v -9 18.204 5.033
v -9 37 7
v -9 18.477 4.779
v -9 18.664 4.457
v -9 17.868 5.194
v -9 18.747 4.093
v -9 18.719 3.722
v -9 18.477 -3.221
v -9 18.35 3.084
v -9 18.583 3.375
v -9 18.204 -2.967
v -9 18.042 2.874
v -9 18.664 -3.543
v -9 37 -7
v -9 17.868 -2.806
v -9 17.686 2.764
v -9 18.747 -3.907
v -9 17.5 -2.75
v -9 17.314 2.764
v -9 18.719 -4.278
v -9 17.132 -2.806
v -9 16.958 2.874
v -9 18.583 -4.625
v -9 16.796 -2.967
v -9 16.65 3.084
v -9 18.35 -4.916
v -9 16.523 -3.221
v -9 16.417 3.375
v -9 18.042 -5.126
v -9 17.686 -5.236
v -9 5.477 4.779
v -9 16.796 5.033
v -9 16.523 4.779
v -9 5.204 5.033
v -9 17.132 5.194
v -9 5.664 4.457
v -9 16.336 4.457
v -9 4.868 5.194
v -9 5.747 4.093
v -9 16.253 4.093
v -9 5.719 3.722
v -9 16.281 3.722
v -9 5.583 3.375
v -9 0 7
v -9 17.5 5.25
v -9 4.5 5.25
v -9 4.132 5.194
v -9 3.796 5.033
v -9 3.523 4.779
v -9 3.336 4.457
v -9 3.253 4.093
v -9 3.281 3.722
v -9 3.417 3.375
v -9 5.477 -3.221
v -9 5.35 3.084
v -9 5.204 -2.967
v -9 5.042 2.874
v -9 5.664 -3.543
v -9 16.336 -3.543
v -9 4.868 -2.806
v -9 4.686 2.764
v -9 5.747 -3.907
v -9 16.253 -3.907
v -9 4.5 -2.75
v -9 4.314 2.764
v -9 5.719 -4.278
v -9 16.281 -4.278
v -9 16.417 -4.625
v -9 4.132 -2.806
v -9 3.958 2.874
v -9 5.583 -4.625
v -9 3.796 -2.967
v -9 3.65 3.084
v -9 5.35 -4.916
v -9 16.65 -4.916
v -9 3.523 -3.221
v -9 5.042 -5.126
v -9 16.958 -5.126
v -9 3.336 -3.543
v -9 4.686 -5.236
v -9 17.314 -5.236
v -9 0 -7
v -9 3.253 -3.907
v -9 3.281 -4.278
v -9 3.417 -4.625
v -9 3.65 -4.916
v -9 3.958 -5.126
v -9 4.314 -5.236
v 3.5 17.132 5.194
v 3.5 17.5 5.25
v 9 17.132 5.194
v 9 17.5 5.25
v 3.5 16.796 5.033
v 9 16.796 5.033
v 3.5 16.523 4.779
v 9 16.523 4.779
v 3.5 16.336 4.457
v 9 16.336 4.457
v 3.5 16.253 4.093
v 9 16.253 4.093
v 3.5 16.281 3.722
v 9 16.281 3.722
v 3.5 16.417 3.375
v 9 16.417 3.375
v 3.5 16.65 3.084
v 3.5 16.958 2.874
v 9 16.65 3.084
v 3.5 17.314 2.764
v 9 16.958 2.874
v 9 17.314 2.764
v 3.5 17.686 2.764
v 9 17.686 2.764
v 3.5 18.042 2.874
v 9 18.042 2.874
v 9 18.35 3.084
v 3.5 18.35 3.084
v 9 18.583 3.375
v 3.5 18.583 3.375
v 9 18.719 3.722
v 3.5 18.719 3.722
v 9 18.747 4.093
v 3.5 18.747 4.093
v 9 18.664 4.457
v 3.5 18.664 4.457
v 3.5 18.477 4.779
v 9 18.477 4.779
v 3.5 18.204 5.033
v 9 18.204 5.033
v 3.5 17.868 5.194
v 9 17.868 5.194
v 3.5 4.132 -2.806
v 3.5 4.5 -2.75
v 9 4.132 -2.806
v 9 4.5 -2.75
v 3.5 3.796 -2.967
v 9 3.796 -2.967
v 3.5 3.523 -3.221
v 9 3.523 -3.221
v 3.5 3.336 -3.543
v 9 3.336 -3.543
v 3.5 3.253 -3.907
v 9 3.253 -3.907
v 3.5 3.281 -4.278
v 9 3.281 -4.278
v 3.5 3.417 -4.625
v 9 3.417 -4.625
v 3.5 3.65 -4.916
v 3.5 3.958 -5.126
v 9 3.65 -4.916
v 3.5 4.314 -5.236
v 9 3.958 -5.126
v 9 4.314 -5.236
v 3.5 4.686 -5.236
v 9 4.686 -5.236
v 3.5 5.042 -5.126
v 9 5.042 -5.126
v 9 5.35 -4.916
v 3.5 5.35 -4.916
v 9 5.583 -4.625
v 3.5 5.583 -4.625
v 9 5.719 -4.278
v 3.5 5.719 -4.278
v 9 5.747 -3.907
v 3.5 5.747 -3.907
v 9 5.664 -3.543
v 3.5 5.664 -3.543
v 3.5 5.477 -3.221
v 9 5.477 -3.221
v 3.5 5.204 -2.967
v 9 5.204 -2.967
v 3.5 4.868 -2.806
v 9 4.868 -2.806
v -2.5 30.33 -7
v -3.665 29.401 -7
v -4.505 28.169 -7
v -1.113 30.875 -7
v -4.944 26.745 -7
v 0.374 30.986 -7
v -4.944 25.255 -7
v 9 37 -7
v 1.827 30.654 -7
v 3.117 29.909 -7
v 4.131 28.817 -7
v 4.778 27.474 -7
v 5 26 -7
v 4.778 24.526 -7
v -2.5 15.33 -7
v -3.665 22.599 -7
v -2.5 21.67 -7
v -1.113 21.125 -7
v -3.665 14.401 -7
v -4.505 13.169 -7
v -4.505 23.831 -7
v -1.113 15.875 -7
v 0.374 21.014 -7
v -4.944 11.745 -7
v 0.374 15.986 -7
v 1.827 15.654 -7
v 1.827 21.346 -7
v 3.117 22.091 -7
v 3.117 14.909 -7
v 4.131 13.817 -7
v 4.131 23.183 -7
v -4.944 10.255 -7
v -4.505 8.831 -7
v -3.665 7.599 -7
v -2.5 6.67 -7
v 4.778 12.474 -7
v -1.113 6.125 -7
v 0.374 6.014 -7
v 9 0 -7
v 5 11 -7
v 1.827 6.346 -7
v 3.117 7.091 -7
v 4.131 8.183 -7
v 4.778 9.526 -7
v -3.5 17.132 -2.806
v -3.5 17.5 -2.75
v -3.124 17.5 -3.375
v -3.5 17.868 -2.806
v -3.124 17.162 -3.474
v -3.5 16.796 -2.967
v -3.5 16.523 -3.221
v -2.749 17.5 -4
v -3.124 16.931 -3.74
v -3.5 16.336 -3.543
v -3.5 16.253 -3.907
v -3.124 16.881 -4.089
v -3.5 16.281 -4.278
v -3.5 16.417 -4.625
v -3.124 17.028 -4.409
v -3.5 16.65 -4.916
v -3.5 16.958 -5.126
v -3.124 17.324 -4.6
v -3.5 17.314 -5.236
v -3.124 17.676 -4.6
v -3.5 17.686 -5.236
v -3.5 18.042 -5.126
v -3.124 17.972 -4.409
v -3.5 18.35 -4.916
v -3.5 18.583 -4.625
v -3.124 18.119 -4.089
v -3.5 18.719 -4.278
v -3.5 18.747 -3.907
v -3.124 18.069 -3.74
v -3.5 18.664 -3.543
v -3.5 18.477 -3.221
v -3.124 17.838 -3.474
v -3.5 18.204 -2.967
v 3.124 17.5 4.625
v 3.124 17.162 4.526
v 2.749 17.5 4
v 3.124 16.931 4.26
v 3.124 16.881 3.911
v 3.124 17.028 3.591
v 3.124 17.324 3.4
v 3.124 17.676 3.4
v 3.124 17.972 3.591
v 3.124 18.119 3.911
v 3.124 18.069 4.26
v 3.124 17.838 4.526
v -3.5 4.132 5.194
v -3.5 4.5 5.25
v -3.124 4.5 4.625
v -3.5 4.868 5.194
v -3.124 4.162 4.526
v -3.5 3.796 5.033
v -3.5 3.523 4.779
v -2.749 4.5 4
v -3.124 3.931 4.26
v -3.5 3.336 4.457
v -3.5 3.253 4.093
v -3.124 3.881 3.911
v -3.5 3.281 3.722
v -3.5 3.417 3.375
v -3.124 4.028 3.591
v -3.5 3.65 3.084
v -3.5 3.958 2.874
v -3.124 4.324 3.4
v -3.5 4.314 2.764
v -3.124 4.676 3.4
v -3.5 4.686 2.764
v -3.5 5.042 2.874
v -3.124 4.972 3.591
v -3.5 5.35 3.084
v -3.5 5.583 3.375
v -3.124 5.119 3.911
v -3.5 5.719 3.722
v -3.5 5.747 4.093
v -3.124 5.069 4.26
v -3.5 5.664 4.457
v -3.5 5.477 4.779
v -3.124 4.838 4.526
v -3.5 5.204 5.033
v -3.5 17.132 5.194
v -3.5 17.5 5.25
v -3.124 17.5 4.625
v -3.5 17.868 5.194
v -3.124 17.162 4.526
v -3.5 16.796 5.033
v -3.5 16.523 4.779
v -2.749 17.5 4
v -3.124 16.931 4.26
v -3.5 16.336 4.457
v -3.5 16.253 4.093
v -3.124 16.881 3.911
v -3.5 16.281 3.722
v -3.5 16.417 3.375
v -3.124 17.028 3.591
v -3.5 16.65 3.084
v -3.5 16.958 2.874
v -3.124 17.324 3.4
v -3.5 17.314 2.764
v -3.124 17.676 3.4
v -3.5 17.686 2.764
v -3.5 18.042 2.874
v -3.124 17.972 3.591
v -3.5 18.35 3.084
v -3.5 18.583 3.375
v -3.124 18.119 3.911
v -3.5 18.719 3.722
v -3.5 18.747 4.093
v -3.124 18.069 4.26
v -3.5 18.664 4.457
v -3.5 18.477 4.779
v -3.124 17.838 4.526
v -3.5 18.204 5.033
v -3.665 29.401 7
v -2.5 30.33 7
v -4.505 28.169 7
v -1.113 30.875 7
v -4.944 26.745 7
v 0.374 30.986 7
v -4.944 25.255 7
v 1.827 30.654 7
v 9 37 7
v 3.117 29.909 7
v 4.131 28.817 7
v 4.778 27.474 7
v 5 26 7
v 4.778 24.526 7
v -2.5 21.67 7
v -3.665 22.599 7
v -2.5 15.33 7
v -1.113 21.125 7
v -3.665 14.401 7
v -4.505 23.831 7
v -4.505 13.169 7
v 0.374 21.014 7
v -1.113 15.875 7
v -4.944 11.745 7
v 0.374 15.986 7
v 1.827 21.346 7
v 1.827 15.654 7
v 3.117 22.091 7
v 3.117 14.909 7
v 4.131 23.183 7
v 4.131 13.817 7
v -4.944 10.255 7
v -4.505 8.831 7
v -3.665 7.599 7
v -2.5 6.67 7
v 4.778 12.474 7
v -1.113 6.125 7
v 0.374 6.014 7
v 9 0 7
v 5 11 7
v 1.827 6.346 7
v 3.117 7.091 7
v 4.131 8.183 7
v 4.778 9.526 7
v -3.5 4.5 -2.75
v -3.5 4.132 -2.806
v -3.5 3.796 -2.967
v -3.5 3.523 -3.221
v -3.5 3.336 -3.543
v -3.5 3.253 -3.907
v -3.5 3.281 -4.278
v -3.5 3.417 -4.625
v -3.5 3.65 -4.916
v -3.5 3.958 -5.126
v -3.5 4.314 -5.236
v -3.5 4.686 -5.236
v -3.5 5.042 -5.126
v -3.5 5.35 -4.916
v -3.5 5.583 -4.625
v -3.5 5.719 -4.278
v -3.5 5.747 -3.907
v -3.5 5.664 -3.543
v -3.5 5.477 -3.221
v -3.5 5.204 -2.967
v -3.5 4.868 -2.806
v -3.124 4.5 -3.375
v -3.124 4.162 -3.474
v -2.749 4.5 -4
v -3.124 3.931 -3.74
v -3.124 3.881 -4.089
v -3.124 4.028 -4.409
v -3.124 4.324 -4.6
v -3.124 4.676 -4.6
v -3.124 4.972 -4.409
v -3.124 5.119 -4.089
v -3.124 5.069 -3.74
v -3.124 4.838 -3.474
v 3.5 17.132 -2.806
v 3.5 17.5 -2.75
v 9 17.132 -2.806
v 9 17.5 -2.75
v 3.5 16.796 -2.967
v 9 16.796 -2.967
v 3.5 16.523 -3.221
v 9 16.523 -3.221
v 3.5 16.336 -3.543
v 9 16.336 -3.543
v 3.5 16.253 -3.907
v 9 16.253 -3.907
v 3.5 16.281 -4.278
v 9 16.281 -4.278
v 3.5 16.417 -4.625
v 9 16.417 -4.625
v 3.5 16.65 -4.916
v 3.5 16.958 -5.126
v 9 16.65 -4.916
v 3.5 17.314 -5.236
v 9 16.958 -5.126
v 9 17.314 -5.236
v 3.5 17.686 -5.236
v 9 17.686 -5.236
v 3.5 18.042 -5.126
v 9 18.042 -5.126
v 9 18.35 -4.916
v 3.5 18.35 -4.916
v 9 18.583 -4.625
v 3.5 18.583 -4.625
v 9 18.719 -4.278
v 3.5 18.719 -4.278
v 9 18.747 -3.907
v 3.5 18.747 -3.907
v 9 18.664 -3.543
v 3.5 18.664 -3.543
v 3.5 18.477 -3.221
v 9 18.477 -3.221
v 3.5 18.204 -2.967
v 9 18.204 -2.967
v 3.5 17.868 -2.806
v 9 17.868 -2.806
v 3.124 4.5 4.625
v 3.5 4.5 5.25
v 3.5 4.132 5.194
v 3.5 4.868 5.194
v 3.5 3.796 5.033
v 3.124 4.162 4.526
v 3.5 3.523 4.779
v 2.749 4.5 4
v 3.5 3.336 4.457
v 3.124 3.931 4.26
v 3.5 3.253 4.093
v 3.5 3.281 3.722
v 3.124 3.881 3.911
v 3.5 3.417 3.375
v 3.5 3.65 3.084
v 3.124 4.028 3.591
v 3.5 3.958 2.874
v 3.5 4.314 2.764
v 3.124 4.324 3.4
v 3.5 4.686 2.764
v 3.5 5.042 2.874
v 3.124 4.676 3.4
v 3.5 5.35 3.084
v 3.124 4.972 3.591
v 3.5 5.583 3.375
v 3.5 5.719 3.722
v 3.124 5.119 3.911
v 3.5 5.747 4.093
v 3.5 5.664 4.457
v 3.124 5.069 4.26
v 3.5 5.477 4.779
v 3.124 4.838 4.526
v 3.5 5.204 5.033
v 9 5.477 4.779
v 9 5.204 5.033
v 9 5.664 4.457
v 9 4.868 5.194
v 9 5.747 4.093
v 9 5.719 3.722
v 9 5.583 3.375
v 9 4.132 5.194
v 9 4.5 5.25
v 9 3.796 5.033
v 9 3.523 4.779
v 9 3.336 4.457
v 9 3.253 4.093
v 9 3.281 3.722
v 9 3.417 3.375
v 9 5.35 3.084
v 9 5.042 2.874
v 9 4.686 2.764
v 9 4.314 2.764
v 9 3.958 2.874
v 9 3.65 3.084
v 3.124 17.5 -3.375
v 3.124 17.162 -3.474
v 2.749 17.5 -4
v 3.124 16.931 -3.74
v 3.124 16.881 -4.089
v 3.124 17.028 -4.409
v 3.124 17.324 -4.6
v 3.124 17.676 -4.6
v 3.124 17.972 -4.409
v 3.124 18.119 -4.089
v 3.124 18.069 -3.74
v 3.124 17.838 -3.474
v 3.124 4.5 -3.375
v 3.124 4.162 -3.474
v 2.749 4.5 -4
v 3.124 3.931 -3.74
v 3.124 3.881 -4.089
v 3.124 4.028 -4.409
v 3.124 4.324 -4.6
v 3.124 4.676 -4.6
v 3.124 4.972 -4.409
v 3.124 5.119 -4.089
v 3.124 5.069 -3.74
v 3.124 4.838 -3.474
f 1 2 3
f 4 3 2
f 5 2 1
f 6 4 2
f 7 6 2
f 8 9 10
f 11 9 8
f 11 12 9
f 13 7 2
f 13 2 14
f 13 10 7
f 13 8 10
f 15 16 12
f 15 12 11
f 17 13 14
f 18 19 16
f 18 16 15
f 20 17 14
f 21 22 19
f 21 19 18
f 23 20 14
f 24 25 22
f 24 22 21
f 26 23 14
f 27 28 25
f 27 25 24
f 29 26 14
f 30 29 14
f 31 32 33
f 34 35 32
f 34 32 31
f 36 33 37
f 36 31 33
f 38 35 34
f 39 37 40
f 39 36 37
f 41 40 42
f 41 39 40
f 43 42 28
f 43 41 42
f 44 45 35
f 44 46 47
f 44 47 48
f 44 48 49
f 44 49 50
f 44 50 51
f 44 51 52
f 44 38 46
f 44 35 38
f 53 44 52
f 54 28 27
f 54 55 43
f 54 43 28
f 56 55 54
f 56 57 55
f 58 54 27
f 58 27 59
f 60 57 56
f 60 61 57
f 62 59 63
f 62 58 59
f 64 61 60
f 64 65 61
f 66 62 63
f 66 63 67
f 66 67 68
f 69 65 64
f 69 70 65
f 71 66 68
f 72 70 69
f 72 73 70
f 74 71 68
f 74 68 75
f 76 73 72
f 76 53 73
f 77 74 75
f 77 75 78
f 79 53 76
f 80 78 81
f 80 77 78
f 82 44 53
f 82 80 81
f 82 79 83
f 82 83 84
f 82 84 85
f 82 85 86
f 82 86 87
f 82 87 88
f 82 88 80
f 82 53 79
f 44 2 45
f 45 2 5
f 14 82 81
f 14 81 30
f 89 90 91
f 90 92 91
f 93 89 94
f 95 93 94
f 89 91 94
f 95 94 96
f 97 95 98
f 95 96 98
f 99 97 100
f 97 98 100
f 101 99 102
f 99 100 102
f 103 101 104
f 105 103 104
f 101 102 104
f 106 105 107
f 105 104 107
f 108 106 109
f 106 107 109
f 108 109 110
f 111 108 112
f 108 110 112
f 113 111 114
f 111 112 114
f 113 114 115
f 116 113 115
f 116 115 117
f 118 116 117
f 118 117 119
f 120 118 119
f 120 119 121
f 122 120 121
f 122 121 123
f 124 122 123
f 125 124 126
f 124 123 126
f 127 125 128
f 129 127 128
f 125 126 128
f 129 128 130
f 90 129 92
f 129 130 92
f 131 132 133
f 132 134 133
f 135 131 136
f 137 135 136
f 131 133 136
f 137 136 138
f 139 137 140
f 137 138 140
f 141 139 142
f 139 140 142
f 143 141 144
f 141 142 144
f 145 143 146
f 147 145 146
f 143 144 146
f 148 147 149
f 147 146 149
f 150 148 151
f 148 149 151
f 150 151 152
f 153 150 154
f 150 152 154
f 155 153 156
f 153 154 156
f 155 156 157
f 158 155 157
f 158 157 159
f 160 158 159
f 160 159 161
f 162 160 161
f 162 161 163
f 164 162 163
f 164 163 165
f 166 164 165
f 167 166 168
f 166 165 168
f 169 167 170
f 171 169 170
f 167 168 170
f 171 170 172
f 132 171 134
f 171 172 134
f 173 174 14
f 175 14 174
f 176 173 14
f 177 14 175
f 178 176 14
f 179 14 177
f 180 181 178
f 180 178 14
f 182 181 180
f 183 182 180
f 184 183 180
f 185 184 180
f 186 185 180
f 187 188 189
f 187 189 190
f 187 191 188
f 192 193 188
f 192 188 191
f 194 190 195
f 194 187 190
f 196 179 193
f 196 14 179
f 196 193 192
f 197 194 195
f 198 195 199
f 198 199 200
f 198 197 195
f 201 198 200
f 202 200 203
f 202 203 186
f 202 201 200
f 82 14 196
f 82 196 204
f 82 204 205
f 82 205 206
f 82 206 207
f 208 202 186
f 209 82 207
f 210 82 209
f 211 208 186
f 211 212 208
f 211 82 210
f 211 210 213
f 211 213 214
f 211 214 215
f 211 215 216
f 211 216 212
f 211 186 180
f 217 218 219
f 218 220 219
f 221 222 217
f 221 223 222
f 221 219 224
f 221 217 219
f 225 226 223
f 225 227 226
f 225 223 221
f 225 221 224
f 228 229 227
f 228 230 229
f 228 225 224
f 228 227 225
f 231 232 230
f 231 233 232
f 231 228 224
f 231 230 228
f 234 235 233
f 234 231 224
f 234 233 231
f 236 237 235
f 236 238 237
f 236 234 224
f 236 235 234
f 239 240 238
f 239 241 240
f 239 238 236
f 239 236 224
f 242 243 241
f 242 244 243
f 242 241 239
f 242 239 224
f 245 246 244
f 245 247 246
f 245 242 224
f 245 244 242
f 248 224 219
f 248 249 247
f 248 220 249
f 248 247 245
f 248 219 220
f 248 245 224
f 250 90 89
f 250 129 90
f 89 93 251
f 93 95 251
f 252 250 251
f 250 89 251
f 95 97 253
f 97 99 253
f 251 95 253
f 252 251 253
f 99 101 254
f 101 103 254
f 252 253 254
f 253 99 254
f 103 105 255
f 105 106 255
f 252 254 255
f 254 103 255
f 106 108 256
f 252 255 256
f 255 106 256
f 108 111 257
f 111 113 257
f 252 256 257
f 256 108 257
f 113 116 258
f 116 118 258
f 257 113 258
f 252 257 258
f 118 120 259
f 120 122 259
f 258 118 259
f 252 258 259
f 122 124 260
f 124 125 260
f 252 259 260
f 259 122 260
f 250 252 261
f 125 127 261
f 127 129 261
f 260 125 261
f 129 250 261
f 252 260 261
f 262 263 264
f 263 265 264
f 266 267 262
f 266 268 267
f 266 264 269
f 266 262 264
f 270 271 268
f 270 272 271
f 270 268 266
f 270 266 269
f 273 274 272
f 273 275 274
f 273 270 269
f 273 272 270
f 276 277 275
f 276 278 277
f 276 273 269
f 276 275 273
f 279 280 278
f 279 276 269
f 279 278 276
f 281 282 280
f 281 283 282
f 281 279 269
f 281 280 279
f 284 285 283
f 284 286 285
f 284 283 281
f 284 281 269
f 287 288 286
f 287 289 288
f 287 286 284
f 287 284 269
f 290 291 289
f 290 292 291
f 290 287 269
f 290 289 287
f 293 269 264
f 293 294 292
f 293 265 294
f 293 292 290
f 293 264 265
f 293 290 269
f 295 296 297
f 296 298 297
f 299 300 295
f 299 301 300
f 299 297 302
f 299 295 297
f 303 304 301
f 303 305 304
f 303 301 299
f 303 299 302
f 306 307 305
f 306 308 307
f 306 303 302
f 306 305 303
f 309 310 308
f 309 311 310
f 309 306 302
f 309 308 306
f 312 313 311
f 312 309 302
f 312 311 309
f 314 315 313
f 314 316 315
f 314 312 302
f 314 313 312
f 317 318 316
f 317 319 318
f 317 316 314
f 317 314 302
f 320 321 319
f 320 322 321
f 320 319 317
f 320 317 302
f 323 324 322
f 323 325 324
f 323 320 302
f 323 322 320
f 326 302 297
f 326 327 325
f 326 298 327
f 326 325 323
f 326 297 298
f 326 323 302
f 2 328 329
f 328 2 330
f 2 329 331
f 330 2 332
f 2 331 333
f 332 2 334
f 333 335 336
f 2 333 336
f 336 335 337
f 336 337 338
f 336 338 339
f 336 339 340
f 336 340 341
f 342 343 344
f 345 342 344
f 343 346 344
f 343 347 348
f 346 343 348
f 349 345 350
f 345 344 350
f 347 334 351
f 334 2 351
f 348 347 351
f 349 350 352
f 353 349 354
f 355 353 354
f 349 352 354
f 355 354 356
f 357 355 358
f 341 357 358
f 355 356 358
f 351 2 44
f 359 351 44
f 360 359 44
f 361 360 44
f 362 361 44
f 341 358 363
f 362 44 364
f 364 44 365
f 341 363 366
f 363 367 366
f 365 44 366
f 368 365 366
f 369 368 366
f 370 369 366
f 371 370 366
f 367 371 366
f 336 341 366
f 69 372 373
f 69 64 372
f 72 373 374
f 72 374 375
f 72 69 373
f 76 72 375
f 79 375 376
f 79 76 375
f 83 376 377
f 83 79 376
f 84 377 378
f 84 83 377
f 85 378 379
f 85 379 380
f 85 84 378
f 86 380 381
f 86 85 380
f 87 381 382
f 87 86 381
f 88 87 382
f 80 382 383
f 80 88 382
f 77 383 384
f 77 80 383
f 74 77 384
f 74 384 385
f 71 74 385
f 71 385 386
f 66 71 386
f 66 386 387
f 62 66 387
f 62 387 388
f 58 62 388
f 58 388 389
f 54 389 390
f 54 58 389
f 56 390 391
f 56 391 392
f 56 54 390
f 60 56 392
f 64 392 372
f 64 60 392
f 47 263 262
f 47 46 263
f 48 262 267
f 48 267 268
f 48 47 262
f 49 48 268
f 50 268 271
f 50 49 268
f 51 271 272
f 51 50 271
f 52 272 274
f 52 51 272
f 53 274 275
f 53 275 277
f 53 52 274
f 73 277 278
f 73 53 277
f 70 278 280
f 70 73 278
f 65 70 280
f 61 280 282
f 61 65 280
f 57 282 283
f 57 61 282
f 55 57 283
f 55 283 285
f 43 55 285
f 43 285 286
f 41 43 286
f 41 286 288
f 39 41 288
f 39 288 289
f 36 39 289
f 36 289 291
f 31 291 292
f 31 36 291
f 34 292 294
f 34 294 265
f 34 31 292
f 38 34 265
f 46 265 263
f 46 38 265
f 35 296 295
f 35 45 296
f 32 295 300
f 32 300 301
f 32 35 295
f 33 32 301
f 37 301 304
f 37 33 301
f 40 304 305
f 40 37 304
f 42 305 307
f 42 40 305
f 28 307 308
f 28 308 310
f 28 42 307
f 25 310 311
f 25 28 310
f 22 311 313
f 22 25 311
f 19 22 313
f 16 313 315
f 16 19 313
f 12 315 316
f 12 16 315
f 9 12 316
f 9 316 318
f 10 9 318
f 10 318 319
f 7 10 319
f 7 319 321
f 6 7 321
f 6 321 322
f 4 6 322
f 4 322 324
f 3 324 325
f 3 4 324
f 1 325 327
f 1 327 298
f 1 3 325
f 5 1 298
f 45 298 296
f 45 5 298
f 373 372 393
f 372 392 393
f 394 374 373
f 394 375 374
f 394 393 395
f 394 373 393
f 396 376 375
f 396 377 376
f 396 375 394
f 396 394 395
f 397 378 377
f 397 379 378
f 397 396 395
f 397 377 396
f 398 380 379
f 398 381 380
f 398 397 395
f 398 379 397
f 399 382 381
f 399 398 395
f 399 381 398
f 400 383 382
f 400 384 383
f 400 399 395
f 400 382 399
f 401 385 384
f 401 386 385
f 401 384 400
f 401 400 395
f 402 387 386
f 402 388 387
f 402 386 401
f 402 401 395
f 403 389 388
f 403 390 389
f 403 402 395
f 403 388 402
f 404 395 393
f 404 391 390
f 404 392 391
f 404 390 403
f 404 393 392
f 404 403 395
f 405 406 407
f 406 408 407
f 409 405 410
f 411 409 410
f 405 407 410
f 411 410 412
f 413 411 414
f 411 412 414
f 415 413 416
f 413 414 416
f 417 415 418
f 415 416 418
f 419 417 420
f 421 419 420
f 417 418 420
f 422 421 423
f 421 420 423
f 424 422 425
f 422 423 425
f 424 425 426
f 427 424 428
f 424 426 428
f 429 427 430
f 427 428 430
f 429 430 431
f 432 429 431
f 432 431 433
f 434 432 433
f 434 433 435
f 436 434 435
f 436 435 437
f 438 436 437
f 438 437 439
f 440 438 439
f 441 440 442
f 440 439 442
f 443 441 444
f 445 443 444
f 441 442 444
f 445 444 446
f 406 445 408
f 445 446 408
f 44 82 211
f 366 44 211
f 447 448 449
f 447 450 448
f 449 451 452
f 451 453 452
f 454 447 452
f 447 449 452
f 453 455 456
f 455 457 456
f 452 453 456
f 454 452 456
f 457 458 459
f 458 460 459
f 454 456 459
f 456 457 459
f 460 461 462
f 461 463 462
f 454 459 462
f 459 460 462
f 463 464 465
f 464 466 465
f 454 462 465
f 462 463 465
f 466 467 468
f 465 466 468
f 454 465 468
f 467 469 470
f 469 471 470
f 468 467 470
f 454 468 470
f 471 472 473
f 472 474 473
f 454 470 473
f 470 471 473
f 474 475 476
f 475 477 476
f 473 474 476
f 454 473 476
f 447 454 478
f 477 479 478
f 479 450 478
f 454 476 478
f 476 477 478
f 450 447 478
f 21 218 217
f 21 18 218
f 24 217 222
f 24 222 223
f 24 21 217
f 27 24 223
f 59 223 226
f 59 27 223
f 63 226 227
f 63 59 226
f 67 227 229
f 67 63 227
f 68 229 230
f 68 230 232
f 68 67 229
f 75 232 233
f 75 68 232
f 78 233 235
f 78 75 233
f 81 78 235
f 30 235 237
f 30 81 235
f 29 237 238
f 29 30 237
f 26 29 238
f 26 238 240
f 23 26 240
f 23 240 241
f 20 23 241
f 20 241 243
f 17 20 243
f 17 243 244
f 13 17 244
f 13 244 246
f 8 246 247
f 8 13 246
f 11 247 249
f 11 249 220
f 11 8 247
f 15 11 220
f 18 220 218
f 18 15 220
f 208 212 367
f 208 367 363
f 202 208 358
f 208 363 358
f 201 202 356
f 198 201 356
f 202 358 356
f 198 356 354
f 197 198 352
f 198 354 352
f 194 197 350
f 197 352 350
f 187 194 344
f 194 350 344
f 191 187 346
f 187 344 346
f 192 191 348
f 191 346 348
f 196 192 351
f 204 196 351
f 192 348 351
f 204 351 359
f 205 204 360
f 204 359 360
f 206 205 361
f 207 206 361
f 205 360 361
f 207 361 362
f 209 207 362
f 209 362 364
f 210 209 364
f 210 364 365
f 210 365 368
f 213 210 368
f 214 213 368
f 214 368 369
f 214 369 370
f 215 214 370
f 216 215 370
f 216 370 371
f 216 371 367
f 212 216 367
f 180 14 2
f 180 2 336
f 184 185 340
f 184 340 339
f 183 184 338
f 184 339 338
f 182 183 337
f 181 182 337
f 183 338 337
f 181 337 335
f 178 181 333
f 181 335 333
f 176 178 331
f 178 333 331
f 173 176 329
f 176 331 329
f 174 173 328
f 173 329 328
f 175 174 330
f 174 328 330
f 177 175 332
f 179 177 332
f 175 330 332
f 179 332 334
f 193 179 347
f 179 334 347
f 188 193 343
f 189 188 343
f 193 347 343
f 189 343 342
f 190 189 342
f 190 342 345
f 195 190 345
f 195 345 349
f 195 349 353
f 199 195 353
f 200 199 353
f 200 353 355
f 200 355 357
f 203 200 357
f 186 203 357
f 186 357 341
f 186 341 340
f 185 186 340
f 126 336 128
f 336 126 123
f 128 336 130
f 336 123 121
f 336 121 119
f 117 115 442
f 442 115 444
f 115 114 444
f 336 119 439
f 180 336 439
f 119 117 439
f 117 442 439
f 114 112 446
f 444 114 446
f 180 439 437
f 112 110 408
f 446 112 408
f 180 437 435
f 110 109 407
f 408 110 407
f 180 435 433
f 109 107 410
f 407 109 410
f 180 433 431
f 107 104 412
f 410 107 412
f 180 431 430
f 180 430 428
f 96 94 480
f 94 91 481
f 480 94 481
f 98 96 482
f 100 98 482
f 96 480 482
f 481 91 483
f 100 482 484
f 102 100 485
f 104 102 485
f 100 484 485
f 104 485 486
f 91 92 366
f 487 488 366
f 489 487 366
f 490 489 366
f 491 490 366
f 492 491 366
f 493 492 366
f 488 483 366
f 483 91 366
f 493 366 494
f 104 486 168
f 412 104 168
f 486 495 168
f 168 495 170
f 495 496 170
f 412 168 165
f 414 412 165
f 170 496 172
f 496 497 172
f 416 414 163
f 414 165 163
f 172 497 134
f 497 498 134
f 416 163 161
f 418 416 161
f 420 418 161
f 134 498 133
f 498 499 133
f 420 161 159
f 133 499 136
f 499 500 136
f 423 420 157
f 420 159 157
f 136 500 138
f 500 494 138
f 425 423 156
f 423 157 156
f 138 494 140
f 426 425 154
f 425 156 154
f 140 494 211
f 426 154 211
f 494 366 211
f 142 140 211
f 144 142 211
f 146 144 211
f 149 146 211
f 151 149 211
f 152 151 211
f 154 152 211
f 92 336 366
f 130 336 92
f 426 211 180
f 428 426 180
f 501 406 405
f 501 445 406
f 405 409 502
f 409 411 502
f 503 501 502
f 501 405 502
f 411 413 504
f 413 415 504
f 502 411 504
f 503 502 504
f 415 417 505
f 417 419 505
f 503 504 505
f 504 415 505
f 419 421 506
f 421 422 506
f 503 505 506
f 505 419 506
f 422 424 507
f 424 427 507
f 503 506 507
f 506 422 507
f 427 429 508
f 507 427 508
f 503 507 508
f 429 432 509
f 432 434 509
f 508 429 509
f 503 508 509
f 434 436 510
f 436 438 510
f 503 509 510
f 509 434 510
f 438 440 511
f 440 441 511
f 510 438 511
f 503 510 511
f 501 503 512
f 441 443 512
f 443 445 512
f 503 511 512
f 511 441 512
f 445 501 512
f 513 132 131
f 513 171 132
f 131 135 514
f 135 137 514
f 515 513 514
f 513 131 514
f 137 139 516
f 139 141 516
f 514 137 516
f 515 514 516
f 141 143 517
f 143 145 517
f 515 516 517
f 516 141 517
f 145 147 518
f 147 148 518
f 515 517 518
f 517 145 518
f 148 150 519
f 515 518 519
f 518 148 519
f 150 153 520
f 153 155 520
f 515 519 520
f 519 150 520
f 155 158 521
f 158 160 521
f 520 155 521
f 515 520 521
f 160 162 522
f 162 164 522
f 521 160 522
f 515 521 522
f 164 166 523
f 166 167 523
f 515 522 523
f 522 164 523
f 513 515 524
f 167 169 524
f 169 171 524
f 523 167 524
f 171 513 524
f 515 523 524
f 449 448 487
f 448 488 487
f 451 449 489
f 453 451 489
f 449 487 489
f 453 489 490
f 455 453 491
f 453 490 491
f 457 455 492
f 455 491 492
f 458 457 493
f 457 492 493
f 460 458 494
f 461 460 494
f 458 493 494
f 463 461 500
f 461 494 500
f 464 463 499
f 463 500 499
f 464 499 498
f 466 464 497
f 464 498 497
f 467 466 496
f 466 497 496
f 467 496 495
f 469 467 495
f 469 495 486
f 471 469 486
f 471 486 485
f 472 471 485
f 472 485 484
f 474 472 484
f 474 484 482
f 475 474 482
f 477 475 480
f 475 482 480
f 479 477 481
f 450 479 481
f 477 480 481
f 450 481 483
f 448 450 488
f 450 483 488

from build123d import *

# Parameters (mm, degrees)
SKETCH2_W                      = 18
SKETCH2_H                      = 14
BOSS_EXTRUDE1_DEPTH            = 37
SKETCH3_R                      = 5
CUT_EXTRUDE1_DEPTH             = 15
M3X0_5_TAPPED_HOLE1_AT_2_COUNT = 2
M3X0_5_TAPPED_HOLE1_AT_2_PITCH = 8
M3X0_5_TAPPED_HOLE1_AT_3_COUNT = 2
M3X0_5_TAPPED_HOLE1_AT_3_PITCH = 15.264337522
M3X0_5_TAPPED_HOLE1_AT_4_COUNT = 2
M3X0_5_TAPPED_HOLE1_AT_4_PITCH = 13


with BuildPart() as part:
    # Sketch2 → Boss-Extrude1 (new body)
    with BuildSketch(Plane(origin=(0, 0, 0), x_dir=(1, 0, 0), z_dir=(0, 1, 0))):
        Rectangle(SKETCH2_W, SKETCH2_H)
    extrude(amount=BOSS_EXTRUDE1_DEPTH)

    # Sketch3 → Cut-Extrude1 (cut, through all)
    with BuildSketch(Plane.XY.offset(7)):
        with Locations((0, 26)):
            Circle(SKETCH3_R)
        with Locations((0, 11)):
            Circle(SKETCH3_R)
    extrude(amount=-CUT_EXTRUDE1_DEPTH, mode=Mode.SUBTRACT)

    # Sketch5 → M3x0.5 Tapped Hole1 (revolve, cut)
    with BuildSketch(Plane(origin=(-9, 17.5, -4), x_dir=(0, 0, 1), z_dir=(0, 1, 0))):
        Polygon((0, 0), (0, 6.251075774), (1.25, 5.5), (1.25, 0), align=None)
    m3x0_5_tapped_hole1 = revolve(axis=Axis((-15.35, 17.5, -4), (1, 0, 0)), mode=Mode.SUBTRACT)

    # M3x0.5 Tapped Hole1 at 2: M3x0.5 Tapped Hole1 ×2
    with Locations(*[(0, 0, i * M3X0_5_TAPPED_HOLE1_AT_2_PITCH) for i in range(1, M3X0_5_TAPPED_HOLE1_AT_2_COUNT)]):
        add(m3x0_5_tapped_hole1, mode=Mode.SUBTRACT)

    # M3x0.5 Tapped Hole1 at 3: M3x0.5 Tapped Hole1 ×2
    with Locations(*[Vector(0, -0.851658317, 0.524097426) * (i * M3X0_5_TAPPED_HOLE1_AT_3_PITCH) for i in range(1, M3X0_5_TAPPED_HOLE1_AT_3_COUNT)]):
        add(m3x0_5_tapped_hole1, mode=Mode.SUBTRACT)

    # M3x0.5 Tapped Hole1 at 4: M3x0.5 Tapped Hole1 ×2
    with Locations(*[(0, -i * M3X0_5_TAPPED_HOLE1_AT_4_PITCH, 0) for i in range(1, M3X0_5_TAPPED_HOLE1_AT_4_COUNT)]):
        add(m3x0_5_tapped_hole1, mode=Mode.SUBTRACT)

    # Mirror1: M3x0.5 Tapped Hole1 across plane
    add(m3x0_5_tapped_hole1.mirror(Plane(origin=(0, 0, 0), x_dir=(0, 0, 1), z_dir=(1, 0, 0))), mode=Mode.SUBTRACT)

    # Mirror1 copy 1 sketch → Mirror1 copy 1 (revolve, cut)
    with BuildSketch(Plane(origin=(9, 17.5, 4), x_dir=(0, 0, 1), z_dir=(0, 1, 0))):
        Polygon((0, 0), (0, -6.251075774), (1.25, -5.5), (1.25, 0), align=None)
    revolve(axis=Axis((15.35, 17.5, 4), (1, 0, 0)), mode=Mode.SUBTRACT)

    # Mirror1 copy 2 sketch → Mirror1 copy 2 (revolve, cut)
    with BuildSketch(Plane(origin=(9, 4.5, 4), x_dir=(0, 0, 1), z_dir=(0, 1, 0))):
        Polygon((0, 0), (0, -6.251075774), (1.25, -5.5), (1.25, 0), align=None)
    revolve(axis=Axis((15.35, 4.5, 4), (1, 0, 0)), mode=Mode.SUBTRACT)

    # Mirror1 copy 3 sketch → Mirror1 copy 3 (revolve, cut)
    with BuildSketch(Plane(origin=(9, 4.5, -4), x_dir=(0, 0, 1), z_dir=(0, 1, 0))):
        Polygon((0, 0), (0, -6.251075774), (1.25, -5.5), (1.25, 0), align=None)
    revolve(axis=Axis((15.35, 4.5, -4), (1, 0, 0)), mode=Mode.SUBTRACT)


solid = part.part
